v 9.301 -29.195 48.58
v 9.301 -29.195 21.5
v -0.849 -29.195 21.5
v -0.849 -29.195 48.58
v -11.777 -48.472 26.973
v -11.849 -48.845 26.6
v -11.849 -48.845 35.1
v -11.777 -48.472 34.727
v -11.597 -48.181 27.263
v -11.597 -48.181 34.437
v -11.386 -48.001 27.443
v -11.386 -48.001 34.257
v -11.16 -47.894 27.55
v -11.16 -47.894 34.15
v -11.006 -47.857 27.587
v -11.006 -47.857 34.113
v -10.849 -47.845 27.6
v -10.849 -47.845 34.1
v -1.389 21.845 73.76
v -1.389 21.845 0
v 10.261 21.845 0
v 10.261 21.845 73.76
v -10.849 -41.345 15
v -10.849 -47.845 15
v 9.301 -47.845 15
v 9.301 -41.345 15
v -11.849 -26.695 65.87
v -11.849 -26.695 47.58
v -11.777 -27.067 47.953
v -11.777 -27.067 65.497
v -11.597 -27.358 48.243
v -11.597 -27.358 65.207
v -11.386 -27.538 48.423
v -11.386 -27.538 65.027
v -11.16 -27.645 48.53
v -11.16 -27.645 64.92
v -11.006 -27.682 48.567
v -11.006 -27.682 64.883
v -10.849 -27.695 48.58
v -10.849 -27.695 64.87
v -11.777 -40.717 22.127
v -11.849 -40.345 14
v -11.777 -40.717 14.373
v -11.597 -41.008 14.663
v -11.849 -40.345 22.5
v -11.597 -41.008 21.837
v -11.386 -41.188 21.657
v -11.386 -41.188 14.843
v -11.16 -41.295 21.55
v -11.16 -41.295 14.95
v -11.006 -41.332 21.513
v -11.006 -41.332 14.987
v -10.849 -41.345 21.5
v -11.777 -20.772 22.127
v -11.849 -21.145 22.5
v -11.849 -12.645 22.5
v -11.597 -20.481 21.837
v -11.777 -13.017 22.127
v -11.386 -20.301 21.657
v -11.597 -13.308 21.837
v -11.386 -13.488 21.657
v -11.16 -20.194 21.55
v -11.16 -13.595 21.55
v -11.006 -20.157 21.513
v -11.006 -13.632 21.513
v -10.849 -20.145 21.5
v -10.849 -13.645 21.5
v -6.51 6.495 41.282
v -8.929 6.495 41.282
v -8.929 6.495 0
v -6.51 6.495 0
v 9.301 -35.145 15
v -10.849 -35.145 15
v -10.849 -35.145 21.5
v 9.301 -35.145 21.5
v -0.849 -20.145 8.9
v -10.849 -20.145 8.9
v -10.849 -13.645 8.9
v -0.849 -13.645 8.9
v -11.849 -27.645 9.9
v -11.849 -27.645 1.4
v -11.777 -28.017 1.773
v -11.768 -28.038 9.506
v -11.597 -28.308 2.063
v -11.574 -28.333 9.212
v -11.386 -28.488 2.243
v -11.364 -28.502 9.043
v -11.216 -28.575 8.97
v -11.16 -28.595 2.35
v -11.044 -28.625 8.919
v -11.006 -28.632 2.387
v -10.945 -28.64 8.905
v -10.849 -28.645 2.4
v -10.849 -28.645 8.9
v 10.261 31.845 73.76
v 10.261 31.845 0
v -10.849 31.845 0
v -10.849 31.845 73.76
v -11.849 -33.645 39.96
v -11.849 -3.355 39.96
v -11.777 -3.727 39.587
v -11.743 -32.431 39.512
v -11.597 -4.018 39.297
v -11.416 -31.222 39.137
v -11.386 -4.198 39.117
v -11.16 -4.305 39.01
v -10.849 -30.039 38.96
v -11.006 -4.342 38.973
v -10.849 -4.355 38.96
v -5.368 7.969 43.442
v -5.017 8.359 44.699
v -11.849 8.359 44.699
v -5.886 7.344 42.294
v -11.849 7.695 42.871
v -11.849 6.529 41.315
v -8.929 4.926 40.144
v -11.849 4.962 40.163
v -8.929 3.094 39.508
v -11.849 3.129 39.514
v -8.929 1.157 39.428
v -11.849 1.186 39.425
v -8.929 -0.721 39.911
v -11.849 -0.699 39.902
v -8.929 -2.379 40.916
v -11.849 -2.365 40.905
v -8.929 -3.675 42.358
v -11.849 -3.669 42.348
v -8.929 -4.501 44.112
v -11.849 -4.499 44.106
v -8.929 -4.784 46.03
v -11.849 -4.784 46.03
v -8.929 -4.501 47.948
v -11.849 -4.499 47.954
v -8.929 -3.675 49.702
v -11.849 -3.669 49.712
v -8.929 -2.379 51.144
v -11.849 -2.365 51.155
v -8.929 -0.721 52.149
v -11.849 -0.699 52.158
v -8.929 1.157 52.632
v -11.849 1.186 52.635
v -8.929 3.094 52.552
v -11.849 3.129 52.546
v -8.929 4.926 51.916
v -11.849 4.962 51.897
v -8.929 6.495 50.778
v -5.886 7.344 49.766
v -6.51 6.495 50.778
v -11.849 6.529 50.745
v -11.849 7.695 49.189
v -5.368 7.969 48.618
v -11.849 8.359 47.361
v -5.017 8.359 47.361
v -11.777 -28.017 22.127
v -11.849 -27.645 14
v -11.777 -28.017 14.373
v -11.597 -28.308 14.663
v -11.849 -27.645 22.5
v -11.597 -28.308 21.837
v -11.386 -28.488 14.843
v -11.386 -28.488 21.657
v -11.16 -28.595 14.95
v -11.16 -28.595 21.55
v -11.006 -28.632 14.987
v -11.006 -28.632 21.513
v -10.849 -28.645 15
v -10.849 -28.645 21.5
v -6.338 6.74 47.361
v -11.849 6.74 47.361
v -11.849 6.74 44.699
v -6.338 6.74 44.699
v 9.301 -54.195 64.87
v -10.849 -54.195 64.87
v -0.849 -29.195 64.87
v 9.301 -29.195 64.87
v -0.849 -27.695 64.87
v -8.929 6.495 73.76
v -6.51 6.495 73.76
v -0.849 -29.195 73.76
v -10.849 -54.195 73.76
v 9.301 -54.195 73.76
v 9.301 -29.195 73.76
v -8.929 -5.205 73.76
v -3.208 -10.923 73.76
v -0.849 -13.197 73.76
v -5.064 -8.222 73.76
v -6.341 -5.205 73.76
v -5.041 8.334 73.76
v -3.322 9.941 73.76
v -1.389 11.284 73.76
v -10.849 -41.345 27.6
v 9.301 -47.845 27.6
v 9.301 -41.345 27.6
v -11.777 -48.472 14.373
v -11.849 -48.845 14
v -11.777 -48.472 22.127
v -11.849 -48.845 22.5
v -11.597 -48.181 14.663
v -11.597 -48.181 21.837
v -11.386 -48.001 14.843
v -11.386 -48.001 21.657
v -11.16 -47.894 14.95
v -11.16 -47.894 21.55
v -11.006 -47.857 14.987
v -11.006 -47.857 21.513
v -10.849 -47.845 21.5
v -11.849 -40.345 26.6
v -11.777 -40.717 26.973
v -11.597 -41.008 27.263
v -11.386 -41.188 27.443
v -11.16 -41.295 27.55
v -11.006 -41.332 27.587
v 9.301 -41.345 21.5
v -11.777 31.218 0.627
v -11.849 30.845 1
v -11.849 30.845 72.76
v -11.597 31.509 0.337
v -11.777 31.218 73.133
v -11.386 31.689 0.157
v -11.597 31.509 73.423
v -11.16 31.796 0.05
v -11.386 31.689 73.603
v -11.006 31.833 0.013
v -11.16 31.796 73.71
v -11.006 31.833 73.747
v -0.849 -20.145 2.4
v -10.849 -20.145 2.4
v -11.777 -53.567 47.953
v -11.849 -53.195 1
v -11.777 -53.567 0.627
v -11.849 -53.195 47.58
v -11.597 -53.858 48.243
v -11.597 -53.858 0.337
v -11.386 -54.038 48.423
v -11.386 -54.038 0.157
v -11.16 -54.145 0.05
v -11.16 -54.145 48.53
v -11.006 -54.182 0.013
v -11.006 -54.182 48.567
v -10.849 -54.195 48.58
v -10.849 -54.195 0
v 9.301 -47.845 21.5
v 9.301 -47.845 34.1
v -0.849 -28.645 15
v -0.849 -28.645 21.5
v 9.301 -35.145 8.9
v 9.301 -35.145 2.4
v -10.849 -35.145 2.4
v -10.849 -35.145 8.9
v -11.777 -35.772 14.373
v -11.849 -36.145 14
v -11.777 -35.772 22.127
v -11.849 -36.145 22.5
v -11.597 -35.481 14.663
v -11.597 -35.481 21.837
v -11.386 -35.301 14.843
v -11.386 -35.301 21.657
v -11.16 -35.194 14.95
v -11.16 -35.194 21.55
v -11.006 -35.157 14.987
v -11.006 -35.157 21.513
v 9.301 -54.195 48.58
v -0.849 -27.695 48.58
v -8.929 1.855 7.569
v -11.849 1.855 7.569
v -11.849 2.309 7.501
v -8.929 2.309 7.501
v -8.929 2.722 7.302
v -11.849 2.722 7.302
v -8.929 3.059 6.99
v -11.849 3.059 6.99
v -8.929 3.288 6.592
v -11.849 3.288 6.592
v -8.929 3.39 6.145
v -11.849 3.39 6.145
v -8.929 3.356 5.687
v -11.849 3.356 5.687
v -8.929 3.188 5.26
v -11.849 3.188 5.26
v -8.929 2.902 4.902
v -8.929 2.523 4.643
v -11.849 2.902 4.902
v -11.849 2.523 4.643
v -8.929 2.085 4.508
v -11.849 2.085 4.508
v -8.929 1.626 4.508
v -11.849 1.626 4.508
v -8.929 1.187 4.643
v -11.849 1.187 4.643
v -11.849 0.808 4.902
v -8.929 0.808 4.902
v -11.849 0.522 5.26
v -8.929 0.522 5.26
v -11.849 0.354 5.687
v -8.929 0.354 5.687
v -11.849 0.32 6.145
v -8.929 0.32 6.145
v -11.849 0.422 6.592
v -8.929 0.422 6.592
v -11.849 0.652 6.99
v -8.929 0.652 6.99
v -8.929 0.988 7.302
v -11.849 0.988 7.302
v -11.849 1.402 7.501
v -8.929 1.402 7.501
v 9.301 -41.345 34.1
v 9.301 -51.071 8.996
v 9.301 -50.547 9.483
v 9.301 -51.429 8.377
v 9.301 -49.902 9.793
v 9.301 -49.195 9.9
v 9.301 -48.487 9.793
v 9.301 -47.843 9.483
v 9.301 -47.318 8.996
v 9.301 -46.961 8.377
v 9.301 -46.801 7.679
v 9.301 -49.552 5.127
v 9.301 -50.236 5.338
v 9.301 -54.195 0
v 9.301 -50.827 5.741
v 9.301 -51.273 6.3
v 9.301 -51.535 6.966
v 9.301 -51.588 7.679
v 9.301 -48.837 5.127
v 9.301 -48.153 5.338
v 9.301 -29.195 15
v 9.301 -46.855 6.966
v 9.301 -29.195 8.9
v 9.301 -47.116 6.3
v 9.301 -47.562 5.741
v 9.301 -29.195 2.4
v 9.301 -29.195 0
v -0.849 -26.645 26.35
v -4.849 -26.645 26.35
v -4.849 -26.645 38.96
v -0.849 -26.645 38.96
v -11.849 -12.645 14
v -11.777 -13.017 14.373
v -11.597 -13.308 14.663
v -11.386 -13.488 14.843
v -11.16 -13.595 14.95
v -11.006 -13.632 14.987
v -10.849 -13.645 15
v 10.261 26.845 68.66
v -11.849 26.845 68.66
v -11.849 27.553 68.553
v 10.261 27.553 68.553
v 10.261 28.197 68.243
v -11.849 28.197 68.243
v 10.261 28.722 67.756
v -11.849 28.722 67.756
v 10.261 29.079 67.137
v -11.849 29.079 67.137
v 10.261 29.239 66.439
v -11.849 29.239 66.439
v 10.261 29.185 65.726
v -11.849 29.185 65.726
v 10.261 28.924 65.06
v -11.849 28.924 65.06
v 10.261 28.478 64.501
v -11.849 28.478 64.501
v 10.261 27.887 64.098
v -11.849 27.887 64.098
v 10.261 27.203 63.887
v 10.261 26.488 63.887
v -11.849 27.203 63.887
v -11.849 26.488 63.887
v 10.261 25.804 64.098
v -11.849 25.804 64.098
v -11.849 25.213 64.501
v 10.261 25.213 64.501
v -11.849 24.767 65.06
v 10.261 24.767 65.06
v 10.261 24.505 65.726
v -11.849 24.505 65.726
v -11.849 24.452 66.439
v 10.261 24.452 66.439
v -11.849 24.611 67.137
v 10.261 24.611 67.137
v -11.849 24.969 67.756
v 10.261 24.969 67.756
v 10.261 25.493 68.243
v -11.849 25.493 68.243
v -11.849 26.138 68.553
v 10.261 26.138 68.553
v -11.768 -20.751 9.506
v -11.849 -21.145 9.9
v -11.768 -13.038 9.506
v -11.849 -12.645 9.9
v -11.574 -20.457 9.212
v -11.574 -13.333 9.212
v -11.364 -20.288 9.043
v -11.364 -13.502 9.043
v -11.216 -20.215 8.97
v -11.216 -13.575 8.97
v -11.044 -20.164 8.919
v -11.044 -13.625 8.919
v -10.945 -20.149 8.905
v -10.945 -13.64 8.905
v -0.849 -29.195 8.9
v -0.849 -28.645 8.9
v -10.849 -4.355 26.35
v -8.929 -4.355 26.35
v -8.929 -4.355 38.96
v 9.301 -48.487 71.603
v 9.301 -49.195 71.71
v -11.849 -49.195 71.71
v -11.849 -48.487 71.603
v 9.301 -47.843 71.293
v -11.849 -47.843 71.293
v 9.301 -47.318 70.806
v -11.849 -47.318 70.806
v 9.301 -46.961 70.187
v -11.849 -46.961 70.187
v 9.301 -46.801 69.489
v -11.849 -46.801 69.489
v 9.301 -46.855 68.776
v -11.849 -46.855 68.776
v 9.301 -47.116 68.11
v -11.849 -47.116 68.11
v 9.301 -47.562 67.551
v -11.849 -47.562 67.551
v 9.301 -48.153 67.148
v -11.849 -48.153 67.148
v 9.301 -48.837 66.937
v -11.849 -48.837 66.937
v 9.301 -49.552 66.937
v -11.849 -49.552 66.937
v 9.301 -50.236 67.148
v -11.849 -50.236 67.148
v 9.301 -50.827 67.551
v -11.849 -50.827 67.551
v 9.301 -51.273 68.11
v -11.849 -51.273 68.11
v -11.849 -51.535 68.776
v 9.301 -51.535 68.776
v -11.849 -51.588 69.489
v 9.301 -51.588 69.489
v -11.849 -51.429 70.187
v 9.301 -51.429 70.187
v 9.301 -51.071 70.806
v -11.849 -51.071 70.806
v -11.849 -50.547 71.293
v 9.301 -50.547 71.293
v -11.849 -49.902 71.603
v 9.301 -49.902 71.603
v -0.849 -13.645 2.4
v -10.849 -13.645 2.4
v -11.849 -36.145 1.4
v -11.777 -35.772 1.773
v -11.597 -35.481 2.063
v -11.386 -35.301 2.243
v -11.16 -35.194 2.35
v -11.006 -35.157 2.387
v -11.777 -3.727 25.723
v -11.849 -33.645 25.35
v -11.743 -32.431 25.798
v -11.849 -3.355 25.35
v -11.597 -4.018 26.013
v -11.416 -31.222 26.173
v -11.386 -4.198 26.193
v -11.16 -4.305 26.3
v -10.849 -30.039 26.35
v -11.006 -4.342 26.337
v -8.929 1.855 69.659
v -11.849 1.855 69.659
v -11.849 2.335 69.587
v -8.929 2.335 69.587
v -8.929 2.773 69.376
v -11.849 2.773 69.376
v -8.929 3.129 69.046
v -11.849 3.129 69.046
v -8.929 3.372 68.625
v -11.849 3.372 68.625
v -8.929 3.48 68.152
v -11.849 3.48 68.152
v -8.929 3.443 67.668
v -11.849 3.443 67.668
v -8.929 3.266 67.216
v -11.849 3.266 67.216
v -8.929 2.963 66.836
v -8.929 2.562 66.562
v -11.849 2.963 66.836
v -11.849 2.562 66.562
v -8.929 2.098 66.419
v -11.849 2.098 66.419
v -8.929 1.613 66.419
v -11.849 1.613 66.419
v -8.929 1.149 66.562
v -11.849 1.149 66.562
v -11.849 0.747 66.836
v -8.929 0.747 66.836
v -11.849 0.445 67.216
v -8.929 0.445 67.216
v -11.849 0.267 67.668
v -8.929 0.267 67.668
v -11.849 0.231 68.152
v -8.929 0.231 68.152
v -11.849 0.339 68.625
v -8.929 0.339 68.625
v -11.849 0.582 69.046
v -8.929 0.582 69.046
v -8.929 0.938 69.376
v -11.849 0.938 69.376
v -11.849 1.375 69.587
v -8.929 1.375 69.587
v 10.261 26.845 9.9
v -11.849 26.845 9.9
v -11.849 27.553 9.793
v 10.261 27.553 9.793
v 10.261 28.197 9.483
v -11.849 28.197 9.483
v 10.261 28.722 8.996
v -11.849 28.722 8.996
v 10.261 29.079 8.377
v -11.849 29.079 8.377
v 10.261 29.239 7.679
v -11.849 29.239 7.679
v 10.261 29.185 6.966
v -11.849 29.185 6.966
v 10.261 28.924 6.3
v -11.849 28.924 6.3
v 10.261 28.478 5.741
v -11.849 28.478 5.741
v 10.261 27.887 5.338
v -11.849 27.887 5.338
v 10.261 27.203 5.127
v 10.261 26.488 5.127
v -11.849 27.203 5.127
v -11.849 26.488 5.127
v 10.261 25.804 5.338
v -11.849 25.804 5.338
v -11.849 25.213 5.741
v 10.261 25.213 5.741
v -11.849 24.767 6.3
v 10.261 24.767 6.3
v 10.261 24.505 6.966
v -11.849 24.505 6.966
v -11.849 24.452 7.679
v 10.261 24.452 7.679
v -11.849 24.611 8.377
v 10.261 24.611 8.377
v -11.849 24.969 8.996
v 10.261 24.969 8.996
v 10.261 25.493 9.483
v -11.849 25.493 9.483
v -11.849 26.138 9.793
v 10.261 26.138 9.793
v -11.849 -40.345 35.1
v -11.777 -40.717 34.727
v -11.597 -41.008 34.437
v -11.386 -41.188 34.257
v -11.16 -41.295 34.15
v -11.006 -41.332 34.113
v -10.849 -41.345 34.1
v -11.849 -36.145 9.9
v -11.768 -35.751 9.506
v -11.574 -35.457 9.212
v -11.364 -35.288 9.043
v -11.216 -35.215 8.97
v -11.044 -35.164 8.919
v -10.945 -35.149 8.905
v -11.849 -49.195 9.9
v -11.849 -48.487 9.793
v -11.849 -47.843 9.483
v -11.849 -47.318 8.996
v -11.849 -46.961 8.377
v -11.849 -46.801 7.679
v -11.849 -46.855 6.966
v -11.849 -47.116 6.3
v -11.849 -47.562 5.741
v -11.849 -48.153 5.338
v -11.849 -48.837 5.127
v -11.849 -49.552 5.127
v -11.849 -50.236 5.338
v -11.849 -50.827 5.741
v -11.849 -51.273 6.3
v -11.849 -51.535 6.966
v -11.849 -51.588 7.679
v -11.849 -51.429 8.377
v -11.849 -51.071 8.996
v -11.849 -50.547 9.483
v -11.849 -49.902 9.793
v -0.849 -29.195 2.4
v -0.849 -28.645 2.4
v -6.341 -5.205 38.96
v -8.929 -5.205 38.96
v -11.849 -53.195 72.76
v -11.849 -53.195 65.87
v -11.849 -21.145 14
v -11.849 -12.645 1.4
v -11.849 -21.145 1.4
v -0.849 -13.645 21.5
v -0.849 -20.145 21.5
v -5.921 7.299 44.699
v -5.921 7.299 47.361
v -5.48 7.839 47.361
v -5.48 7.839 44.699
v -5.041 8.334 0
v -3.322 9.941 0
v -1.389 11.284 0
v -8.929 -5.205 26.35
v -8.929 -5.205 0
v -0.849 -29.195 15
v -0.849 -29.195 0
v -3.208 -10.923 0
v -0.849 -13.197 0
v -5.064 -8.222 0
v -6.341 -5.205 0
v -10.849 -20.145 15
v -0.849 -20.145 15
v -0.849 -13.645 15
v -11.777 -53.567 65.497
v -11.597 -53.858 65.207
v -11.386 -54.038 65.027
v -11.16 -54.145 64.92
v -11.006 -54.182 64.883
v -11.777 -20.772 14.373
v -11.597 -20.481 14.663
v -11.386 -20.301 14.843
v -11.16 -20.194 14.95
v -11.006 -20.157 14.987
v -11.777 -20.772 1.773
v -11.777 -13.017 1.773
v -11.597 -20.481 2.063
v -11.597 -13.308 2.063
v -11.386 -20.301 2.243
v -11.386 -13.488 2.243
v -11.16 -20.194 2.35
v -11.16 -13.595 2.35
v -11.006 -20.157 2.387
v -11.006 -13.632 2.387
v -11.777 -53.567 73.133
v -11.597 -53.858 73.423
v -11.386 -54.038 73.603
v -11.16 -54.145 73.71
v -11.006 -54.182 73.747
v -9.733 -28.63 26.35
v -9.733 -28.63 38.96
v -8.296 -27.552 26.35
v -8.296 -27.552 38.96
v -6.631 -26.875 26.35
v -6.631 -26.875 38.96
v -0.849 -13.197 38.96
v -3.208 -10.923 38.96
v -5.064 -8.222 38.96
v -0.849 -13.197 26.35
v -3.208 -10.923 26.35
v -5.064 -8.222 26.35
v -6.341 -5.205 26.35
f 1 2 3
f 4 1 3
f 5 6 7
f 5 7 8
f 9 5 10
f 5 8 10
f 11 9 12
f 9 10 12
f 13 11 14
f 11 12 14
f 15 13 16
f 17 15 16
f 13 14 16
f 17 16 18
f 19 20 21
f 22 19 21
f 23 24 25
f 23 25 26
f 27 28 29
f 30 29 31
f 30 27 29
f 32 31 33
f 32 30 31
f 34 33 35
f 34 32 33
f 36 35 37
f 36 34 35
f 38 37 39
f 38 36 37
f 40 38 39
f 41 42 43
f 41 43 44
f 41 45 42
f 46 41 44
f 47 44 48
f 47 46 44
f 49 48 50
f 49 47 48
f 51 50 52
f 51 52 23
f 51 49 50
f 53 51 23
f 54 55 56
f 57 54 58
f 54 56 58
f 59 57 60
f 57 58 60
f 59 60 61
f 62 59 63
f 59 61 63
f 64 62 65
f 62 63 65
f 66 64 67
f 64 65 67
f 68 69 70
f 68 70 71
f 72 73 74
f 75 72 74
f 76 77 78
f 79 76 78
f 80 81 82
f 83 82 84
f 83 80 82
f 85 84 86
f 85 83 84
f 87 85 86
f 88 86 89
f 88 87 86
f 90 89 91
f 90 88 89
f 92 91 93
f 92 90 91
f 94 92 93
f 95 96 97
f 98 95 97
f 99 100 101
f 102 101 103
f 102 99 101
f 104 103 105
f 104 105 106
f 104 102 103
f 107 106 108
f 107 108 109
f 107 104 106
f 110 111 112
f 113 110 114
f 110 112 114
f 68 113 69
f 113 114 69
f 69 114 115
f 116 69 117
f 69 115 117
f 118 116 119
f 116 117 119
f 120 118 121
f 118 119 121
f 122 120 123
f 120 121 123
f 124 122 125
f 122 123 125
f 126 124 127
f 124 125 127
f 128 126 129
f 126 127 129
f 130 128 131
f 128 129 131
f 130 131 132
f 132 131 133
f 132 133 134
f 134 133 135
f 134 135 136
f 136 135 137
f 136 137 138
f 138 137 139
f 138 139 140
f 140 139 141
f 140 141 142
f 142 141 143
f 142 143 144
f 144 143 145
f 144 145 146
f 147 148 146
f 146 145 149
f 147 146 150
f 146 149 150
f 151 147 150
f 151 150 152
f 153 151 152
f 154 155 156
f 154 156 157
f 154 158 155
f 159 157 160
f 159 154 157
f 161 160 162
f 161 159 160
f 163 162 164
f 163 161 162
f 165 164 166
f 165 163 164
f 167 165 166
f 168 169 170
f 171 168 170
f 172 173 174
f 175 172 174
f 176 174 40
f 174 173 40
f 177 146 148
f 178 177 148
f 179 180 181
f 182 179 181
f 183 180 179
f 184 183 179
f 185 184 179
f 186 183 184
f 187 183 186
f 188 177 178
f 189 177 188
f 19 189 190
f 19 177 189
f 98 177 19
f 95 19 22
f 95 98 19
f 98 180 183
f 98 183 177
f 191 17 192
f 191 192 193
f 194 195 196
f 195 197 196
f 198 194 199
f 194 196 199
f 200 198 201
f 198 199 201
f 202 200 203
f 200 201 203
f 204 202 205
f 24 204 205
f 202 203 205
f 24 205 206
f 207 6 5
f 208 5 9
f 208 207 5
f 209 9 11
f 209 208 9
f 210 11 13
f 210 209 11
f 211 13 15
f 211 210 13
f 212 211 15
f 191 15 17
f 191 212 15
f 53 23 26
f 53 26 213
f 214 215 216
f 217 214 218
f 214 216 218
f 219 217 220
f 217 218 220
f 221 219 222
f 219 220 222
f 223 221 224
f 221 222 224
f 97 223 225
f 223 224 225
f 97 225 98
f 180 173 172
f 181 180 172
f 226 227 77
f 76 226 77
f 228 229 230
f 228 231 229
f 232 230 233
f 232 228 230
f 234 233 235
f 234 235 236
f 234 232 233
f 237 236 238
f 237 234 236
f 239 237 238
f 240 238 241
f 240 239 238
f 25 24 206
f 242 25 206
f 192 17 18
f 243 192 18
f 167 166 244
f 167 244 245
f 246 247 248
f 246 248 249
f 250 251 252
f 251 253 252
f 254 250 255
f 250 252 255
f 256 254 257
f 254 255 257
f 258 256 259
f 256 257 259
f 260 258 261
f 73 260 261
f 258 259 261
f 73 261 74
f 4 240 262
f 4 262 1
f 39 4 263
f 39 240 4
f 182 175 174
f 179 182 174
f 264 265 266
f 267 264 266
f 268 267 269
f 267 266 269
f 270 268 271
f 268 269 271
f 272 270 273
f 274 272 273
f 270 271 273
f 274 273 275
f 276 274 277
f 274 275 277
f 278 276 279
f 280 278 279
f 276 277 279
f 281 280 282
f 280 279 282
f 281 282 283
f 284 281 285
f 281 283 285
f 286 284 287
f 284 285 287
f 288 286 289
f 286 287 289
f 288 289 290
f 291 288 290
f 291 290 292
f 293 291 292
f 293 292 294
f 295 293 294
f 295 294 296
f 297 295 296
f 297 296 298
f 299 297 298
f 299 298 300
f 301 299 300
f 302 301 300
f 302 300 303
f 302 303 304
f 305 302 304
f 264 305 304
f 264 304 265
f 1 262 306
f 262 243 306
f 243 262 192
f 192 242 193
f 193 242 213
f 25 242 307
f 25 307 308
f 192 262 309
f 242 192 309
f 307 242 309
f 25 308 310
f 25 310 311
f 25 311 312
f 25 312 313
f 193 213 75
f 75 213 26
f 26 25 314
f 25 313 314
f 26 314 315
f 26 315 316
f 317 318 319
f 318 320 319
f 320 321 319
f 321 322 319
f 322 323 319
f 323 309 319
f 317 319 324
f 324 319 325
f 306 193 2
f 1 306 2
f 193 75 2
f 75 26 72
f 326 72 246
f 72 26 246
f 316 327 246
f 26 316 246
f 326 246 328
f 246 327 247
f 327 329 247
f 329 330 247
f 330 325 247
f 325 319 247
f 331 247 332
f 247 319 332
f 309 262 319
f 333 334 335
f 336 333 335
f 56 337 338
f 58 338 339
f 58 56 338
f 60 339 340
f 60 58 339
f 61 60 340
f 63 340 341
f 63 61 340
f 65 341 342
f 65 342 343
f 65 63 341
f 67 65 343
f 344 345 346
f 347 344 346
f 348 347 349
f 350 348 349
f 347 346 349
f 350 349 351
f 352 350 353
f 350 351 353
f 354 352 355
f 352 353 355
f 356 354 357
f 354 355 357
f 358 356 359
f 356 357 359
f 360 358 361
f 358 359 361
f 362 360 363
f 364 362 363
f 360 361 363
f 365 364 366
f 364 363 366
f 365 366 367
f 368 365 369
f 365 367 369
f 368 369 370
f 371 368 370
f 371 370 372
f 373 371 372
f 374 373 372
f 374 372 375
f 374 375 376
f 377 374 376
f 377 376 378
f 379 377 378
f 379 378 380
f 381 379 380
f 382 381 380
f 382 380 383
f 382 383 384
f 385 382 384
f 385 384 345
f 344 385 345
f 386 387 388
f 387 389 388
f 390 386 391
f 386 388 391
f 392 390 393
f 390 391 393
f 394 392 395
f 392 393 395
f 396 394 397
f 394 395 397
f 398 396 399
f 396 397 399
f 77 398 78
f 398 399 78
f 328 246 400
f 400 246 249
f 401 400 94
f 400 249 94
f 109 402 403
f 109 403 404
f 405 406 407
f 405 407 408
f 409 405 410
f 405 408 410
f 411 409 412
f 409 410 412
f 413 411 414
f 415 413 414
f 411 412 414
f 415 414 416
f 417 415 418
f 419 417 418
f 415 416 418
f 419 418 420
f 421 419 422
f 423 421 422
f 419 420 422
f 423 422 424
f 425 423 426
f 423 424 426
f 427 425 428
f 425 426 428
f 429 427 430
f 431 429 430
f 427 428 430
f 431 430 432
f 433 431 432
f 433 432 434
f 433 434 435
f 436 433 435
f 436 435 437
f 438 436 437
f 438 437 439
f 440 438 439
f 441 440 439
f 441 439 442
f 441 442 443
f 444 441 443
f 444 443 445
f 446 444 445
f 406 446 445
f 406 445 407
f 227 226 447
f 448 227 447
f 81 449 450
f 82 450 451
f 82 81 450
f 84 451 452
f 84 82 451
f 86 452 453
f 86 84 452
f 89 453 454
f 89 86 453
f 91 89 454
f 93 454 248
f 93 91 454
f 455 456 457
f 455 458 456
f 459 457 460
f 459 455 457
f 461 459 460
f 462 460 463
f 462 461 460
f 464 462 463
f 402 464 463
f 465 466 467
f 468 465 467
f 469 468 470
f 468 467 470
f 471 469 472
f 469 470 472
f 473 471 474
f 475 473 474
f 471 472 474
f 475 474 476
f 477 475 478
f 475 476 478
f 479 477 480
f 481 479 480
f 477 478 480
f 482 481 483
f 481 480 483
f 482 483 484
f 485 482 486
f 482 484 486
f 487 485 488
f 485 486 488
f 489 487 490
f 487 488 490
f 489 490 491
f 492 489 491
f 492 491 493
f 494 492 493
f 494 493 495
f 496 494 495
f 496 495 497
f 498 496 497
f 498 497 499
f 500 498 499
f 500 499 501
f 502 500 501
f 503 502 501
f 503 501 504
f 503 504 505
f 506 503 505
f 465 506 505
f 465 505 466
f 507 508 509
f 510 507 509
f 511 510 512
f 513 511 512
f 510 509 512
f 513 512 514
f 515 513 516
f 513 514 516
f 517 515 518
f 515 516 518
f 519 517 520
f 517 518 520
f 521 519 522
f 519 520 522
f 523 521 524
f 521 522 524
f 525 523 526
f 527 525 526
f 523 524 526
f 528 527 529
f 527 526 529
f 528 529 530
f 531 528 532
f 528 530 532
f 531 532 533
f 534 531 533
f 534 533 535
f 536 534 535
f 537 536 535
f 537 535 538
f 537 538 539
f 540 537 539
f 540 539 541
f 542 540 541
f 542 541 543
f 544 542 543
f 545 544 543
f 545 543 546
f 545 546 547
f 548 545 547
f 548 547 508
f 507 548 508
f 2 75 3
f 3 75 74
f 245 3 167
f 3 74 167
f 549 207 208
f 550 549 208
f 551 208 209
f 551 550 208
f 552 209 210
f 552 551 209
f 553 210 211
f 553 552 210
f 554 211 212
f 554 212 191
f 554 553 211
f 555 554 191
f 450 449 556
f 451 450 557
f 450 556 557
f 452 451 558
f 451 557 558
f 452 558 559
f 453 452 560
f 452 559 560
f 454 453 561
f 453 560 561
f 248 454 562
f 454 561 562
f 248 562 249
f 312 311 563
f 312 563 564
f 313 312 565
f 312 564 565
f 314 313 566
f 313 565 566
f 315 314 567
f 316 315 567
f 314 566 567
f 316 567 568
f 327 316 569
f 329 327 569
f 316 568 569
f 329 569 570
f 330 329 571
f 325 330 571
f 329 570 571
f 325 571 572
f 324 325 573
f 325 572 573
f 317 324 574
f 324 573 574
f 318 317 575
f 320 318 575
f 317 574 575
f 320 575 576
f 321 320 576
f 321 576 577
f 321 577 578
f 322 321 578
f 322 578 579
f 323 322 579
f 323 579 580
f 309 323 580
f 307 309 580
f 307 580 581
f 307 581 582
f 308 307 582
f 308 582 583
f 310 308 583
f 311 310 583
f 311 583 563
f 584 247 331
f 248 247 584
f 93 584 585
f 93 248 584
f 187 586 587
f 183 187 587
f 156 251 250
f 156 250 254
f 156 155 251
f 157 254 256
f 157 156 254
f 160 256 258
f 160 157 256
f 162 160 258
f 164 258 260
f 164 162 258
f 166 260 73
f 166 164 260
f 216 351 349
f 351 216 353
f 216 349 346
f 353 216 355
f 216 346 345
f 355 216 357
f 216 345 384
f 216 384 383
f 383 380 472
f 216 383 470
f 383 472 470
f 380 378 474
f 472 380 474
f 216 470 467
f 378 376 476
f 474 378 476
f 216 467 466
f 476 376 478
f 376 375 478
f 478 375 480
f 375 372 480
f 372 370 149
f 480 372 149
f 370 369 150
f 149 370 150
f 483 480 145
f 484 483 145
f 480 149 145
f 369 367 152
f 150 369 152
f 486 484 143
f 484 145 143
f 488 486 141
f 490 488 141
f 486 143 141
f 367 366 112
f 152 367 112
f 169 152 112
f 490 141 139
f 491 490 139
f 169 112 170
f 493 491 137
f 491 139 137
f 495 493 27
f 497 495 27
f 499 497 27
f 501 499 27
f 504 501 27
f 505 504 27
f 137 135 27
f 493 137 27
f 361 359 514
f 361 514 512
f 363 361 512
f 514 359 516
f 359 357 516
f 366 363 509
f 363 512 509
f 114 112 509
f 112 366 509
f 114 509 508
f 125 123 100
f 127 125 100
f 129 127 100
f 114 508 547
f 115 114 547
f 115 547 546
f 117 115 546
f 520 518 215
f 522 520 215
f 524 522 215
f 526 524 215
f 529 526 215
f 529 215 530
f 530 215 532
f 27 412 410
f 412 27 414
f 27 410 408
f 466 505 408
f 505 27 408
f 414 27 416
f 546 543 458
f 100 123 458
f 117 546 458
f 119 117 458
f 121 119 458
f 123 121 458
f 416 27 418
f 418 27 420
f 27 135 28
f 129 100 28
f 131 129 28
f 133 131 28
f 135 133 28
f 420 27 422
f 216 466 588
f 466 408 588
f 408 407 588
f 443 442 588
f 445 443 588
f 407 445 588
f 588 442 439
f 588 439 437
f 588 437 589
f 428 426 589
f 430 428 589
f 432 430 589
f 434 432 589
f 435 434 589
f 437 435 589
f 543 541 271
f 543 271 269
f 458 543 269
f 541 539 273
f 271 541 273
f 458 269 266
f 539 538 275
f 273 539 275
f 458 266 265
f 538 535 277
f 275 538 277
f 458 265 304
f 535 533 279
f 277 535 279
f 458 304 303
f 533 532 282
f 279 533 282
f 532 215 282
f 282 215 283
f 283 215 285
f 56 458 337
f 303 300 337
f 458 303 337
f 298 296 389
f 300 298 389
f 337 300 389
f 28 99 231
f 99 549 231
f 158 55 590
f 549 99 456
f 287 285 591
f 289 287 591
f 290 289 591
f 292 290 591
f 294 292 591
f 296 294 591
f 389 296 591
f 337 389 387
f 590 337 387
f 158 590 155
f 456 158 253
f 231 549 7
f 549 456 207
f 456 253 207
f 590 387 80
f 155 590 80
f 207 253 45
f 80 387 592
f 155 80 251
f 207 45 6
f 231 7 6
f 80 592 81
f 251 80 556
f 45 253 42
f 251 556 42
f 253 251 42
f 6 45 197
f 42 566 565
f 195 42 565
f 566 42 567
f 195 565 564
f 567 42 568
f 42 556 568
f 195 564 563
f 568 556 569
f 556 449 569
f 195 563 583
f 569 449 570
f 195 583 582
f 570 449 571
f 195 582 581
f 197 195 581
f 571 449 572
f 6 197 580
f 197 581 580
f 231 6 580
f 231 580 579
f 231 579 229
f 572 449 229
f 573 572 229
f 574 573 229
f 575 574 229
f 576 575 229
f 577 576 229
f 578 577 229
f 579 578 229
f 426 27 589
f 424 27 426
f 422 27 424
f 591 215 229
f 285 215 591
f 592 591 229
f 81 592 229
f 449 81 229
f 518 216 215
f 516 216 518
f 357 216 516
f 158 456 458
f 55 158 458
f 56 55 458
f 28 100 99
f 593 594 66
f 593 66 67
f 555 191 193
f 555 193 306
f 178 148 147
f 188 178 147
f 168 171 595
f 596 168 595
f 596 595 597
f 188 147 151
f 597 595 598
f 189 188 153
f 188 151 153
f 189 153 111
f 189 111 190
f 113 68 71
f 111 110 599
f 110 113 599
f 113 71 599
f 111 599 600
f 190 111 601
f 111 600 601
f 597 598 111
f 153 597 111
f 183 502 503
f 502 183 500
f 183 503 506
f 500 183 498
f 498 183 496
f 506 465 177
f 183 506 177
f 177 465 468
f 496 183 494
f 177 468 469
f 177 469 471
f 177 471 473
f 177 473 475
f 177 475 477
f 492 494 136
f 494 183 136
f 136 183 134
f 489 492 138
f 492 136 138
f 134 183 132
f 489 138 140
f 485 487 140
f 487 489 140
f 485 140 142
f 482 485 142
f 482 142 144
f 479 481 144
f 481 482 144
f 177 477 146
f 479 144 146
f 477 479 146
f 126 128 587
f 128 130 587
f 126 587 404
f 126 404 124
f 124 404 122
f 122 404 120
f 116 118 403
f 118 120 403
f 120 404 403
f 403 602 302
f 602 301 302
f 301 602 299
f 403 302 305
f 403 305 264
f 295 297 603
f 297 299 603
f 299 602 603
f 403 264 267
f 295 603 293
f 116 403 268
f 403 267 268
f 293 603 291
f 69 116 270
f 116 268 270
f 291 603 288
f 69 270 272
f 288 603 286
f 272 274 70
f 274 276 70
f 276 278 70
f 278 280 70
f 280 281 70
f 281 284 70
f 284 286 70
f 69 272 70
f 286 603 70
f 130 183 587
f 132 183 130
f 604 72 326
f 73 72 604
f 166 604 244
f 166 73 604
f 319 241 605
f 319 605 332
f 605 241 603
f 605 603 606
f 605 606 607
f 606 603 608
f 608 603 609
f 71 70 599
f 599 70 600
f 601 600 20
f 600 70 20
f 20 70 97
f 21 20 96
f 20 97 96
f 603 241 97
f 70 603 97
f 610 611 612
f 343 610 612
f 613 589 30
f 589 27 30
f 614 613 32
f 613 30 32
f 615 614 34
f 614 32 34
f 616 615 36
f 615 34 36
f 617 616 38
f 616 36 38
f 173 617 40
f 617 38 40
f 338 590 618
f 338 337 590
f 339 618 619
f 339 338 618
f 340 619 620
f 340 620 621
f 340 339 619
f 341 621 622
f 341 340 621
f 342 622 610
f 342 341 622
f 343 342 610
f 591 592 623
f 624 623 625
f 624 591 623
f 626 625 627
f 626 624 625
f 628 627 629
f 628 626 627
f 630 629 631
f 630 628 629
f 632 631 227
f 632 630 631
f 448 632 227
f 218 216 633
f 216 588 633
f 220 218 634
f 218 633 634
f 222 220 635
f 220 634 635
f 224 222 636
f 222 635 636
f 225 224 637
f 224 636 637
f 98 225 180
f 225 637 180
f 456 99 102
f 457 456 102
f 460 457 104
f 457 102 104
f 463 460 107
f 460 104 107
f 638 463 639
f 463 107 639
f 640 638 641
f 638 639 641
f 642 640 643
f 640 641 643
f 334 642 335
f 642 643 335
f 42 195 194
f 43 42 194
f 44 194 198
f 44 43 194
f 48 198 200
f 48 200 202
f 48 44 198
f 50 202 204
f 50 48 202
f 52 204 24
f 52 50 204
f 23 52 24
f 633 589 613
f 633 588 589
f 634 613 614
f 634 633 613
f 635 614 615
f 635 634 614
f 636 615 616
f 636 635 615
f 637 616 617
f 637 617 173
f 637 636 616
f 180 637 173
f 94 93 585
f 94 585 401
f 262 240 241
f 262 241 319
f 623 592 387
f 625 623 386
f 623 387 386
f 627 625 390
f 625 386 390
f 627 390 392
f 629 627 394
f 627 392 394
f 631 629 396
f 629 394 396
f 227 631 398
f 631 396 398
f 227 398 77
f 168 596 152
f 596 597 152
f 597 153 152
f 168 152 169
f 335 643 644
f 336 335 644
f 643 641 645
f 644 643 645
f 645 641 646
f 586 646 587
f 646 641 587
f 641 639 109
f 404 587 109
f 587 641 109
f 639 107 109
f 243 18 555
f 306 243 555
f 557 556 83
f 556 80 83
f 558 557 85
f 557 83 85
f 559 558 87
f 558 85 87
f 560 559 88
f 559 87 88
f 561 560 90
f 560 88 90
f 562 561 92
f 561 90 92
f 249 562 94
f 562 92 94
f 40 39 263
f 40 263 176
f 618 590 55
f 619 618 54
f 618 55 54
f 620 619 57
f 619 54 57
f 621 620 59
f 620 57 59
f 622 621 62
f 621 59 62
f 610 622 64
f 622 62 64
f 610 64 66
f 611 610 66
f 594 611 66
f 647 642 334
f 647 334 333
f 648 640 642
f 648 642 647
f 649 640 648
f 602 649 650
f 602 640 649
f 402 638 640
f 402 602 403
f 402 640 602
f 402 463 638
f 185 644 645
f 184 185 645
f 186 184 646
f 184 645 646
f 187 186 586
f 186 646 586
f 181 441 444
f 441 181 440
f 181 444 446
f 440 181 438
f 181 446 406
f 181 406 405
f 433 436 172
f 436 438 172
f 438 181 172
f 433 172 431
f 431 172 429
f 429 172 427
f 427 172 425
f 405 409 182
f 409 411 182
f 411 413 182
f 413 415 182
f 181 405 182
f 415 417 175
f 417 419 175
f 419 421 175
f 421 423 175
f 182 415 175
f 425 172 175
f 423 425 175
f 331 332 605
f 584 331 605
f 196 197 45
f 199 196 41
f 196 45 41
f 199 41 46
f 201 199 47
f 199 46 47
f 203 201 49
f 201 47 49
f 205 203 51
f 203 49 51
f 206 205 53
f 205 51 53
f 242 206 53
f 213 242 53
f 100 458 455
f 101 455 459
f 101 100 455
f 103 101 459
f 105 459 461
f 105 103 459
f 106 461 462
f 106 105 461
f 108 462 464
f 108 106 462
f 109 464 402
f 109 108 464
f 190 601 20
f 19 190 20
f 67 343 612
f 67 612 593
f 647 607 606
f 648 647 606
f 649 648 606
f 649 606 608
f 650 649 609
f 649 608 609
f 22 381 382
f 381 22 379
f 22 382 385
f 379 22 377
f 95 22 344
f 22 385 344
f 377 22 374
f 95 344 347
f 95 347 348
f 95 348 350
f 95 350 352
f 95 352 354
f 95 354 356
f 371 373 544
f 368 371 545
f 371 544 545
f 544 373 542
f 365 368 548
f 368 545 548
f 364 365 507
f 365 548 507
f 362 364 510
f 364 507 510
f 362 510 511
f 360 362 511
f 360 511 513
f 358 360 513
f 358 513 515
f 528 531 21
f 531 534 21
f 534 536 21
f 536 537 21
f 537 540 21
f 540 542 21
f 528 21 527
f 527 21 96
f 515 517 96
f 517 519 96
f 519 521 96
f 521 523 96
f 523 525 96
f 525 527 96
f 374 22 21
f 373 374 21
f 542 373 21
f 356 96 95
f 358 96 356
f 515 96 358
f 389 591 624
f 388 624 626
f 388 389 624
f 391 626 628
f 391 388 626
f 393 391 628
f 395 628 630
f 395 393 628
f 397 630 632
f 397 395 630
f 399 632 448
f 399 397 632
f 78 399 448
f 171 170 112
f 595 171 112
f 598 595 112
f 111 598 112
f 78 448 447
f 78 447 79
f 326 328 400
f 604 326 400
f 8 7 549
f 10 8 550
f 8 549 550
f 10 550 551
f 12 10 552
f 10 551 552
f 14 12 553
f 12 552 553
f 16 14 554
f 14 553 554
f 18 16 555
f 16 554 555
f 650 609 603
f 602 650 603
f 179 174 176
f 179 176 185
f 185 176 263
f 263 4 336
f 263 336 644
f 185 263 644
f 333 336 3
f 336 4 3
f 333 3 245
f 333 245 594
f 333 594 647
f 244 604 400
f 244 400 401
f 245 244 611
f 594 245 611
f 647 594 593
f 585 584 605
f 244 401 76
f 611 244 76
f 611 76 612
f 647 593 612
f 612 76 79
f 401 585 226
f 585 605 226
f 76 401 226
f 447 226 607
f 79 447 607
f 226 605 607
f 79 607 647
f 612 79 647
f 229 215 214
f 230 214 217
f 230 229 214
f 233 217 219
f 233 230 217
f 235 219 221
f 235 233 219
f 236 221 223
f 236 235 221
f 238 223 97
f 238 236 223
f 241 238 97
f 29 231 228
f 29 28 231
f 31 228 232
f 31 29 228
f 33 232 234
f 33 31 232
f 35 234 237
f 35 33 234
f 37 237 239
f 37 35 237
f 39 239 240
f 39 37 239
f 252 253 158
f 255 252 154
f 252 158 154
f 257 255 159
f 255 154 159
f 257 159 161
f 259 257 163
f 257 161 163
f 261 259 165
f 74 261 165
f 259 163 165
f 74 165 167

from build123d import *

# Parameters (mm, degrees)
PROFILEEXTRUDE_DEPTH    = 73.76
HOSEWINDOW_W            = 16.29
HOSEWINDOW_H            = 26.5
HOSEWINDOWCUT_DEPTH     = 23.11
CAGESCREWS_R            = 2.4
CAGESCREWSCUT_DEPTH     = 23.11
AXLEHOLECUT_DEPTH       = 23.11
SETSCREWHOLES_R         = 1.539432213
SETSCREWHOLES_R_2       = 1.628953018
SETSCREWHOLESCUT_DEPTH  = 23.11
VELOCITYWINDOW_W        = 12.61
VELOCITYWINDOW_H        = 22.29
VELOCITYWINDOWCUT_DEPTH = 23.11
FILLET3_R               = 7
TRIGGERRACKSLOTCUT_W    = 6.5
TRIGGERRACKSLOTCUT_H    = 6.5
RACKSLOTCUT_DEPTH       = 23.11
FILLET4_R               = 1


with BuildPart() as part:
    # Profile → ProfileExtrude (new body)
    with BuildSketch(Plane.XY):
        with BuildLine():
            Line((9.301269376, -54.194713793), (9.301269376, -29.194713793))
            Line((9.301269376, -29.194713793), (-0.848730624, -29.194713793))
            Line((-0.848730624, -29.194713793), (-0.848730624, -13.196583793))
            ThreePointArc((-0.848730624, -13.196583793), (-4.204324299, -9.619560571), (-6.340730624, -5.204713793))
            Line((-6.340730624, -5.204713793), (-8.928730624, -5.204713793))
            Line((-8.928730624, -5.204713793), (-8.928730624, 6.495286207))
            Line((-8.928730624, 6.495286207), (-6.509650624, 6.495286207))
            ThreePointArc((-6.509650624, 6.495286207), (-4.210311879, 9.168674207), (-1.388730624, 11.283536207))
            Line((-1.388730624, 11.283536207), (-1.388730624, 21.845286207))
            Line((-1.388730624, 21.845286207), (10.261269376, 21.845286207))
            Line((10.261269376, 21.845286207), (10.261269376, 31.845286207))
            Line((10.261269376, 31.845286207), (-11.848730624, 31.845286207))
            Line((-11.848730624, 31.845286207), (-11.848730624, -54.194713793))
            Line((-11.848730624, -54.194713793), (9.301269376, -54.194713793))
        make_face()
    extrude(amount=PROFILEEXTRUDE_DEPTH)

    # HoseWindow → HoseWindowCut (cut, through all)
    with BuildSketch(Plane.ZY.offset(11.848730624)):
        with Locations((56.725, -40.944713793)):
            Rectangle(HOSEWINDOW_W, HOSEWINDOW_H)
    extrude(amount=-HOSEWINDOWCUT_DEPTH, mode=Mode.SUBTRACT)

    # CageScrews → CageScrewsCut (cut, through all)
    with BuildSketch(Plane.ZY.offset(11.848730624)):
        with Locations((7.5, 26.845286207)):
            Circle(CAGESCREWS_R)
        with Locations((66.26, 26.845286207)):
            Circle(CAGESCREWS_R)
        with Locations((7.5, -49.194713793)):
            Circle(CAGESCREWS_R)
        with Locations((69.31, -49.194713793)):
            Circle(CAGESCREWS_R)
    extrude(amount=-CAGESCREWSCUT_DEPTH, mode=Mode.SUBTRACT)

    # AxleHole → AxleHoleCut (cut, through all)
    with BuildSketch(Plane.ZY.offset(11.848730624)):
        with BuildLine():
            Line((47.361, 8.359497151), (47.361, 6.740497151))
            Line((47.361, 6.740497151), (44.699, 6.740497151))
            Line((44.699, 6.740497151), (44.699, 8.359497151))
            ThreePointArc((44.699, 8.359497151), (46.03, -4.783713793), (47.361, 8.359497151))
        make_face()
    extrude(amount=-AXLEHOLECUT_DEPTH, mode=Mode.SUBTRACT)

    # SetScrewHoles → SetScrewHolesCut (cut, through all)
    with BuildSketch(Plane.ZY.offset(11.848730624)):
        with Locations((6.03, 1.855286207)):
            Circle(SETSCREWHOLES_R)
        with Locations((68.03, 1.855286207)):
            Circle(SETSCREWHOLES_R_2)
    extrude(amount=-SETSCREWHOLESCUT_DEPTH, mode=Mode.SUBTRACT)

    # VelocityWindow → VelocityWindowCut (cut, through all)
    with BuildSketch(Plane.ZY.offset(11.848730624)):
        with Locations((32.655, -15.499713793)):
            Rectangle(VELOCITYWINDOW_W, VELOCITYWINDOW_H)
    extrude(amount=-VELOCITYWINDOWCUT_DEPTH, mode=Mode.SUBTRACT)

    # Fillet3
    fillet3_edges = [part.edges().sort_by_distance(p)[0] for p in [
        (-11.848730624, -26.644713793, 32.655),
    ]]
    fillet(fillet3_edges, radius=FILLET3_R)

    # TriggerRackSlotCut → RackSlotCut (cut, through all)
    with BuildSketch(Plane.ZY.offset(11.848730624)):
        with Locations((18.25, -44.594713793)):
            Rectangle(TRIGGERRACKSLOTCUT_W, TRIGGERRACKSLOTCUT_H)
        with Locations((30.85, -44.594713793)):
            Rectangle(TRIGGERRACKSLOTCUT_W, TRIGGERRACKSLOTCUT_H)
        with Locations((5.65, -31.894713793)):
            Rectangle(TRIGGERRACKSLOTCUT_W, TRIGGERRACKSLOTCUT_H)
        with Locations((18.25, -31.894713793)):
            Rectangle(TRIGGERRACKSLOTCUT_W, TRIGGERRACKSLOTCUT_H)
        with Locations((5.65, -16.894713793)):
            Rectangle(TRIGGERRACKSLOTCUT_W, TRIGGERRACKSLOTCUT_H)
        with Locations((18.25, -16.894713793)):
            Rectangle(TRIGGERRACKSLOTCUT_W, TRIGGERRACKSLOTCUT_H)
    extrude(amount=-RACKSLOTCUT_DEPTH, mode=Mode.SUBTRACT)

    # Fillet4
    fillet4_edges = [part.edges().sort_by_distance(p)[0] for p in [
        (-11.848730624, -11.174713793, 73.76),
        (-11.848730624, -18.999713793, 26.35),
        (-11.848730624, -18.999713793, 38.96),
        (-11.848730624, -4.354713793, 32.655),
        (-11.848730624, -44.594713793, 15),
        (-11.848730624, -47.844713793, 18.25),
        (-11.848730624, -44.594713793, 21.5),
        (-11.848730624, -41.344713793, 18.25),
        (-11.848730624, -11.174713793, 0),
        (-11.848730624, -44.594713793, 27.6),
        (-11.848730624, -47.844713793, 30.85),
        (-11.848730624, -44.594713793, 34.1),
        (-11.848730624, -41.344713793, 30.85),
        (-11.848730624, -31.894713793, 2.4),
        (-11.848730624, -35.144713793, 5.65),
        (-11.848730624, -31.894713793, 8.9),
        (-11.848730624, -28.644713793, 5.65),
        (-11.848730624, -31.894713793, 15),
        (-11.848730624, -35.144713793, 18.25),
        (-11.848730624, -31.894713793, 21.5),
        (-11.848730624, -28.644713793, 18.25),
        (-11.848730624, -54.194713793, 69.315),
        (-11.848730624, 31.845286207, 36.88),
        (-11.848730624, -16.894713793, 2.4),
        (-11.848730624, -20.144713793, 5.65),
        (-11.848730624, -16.894713793, 8.9),
        (-11.848730624, -13.644713793, 5.65),
        (-11.848730624, -16.894713793, 15),
        (-11.848730624, -20.144713793, 18.25),
        (-11.848730624, -16.894713793, 21.5),
        (-11.848730624, -13.644713793, 18.25),
        (-11.848730624, -54.194713793, 24.29),
        (-11.848730624, -40.944713793, 64.87),
        (-11.848730624, -27.694713793, 56.725),
        (-11.848730624, -40.944713793, 48.58),
    ]]
    fillet(fillet4_edges, radius=FILLET4_R)


solid = part.part
